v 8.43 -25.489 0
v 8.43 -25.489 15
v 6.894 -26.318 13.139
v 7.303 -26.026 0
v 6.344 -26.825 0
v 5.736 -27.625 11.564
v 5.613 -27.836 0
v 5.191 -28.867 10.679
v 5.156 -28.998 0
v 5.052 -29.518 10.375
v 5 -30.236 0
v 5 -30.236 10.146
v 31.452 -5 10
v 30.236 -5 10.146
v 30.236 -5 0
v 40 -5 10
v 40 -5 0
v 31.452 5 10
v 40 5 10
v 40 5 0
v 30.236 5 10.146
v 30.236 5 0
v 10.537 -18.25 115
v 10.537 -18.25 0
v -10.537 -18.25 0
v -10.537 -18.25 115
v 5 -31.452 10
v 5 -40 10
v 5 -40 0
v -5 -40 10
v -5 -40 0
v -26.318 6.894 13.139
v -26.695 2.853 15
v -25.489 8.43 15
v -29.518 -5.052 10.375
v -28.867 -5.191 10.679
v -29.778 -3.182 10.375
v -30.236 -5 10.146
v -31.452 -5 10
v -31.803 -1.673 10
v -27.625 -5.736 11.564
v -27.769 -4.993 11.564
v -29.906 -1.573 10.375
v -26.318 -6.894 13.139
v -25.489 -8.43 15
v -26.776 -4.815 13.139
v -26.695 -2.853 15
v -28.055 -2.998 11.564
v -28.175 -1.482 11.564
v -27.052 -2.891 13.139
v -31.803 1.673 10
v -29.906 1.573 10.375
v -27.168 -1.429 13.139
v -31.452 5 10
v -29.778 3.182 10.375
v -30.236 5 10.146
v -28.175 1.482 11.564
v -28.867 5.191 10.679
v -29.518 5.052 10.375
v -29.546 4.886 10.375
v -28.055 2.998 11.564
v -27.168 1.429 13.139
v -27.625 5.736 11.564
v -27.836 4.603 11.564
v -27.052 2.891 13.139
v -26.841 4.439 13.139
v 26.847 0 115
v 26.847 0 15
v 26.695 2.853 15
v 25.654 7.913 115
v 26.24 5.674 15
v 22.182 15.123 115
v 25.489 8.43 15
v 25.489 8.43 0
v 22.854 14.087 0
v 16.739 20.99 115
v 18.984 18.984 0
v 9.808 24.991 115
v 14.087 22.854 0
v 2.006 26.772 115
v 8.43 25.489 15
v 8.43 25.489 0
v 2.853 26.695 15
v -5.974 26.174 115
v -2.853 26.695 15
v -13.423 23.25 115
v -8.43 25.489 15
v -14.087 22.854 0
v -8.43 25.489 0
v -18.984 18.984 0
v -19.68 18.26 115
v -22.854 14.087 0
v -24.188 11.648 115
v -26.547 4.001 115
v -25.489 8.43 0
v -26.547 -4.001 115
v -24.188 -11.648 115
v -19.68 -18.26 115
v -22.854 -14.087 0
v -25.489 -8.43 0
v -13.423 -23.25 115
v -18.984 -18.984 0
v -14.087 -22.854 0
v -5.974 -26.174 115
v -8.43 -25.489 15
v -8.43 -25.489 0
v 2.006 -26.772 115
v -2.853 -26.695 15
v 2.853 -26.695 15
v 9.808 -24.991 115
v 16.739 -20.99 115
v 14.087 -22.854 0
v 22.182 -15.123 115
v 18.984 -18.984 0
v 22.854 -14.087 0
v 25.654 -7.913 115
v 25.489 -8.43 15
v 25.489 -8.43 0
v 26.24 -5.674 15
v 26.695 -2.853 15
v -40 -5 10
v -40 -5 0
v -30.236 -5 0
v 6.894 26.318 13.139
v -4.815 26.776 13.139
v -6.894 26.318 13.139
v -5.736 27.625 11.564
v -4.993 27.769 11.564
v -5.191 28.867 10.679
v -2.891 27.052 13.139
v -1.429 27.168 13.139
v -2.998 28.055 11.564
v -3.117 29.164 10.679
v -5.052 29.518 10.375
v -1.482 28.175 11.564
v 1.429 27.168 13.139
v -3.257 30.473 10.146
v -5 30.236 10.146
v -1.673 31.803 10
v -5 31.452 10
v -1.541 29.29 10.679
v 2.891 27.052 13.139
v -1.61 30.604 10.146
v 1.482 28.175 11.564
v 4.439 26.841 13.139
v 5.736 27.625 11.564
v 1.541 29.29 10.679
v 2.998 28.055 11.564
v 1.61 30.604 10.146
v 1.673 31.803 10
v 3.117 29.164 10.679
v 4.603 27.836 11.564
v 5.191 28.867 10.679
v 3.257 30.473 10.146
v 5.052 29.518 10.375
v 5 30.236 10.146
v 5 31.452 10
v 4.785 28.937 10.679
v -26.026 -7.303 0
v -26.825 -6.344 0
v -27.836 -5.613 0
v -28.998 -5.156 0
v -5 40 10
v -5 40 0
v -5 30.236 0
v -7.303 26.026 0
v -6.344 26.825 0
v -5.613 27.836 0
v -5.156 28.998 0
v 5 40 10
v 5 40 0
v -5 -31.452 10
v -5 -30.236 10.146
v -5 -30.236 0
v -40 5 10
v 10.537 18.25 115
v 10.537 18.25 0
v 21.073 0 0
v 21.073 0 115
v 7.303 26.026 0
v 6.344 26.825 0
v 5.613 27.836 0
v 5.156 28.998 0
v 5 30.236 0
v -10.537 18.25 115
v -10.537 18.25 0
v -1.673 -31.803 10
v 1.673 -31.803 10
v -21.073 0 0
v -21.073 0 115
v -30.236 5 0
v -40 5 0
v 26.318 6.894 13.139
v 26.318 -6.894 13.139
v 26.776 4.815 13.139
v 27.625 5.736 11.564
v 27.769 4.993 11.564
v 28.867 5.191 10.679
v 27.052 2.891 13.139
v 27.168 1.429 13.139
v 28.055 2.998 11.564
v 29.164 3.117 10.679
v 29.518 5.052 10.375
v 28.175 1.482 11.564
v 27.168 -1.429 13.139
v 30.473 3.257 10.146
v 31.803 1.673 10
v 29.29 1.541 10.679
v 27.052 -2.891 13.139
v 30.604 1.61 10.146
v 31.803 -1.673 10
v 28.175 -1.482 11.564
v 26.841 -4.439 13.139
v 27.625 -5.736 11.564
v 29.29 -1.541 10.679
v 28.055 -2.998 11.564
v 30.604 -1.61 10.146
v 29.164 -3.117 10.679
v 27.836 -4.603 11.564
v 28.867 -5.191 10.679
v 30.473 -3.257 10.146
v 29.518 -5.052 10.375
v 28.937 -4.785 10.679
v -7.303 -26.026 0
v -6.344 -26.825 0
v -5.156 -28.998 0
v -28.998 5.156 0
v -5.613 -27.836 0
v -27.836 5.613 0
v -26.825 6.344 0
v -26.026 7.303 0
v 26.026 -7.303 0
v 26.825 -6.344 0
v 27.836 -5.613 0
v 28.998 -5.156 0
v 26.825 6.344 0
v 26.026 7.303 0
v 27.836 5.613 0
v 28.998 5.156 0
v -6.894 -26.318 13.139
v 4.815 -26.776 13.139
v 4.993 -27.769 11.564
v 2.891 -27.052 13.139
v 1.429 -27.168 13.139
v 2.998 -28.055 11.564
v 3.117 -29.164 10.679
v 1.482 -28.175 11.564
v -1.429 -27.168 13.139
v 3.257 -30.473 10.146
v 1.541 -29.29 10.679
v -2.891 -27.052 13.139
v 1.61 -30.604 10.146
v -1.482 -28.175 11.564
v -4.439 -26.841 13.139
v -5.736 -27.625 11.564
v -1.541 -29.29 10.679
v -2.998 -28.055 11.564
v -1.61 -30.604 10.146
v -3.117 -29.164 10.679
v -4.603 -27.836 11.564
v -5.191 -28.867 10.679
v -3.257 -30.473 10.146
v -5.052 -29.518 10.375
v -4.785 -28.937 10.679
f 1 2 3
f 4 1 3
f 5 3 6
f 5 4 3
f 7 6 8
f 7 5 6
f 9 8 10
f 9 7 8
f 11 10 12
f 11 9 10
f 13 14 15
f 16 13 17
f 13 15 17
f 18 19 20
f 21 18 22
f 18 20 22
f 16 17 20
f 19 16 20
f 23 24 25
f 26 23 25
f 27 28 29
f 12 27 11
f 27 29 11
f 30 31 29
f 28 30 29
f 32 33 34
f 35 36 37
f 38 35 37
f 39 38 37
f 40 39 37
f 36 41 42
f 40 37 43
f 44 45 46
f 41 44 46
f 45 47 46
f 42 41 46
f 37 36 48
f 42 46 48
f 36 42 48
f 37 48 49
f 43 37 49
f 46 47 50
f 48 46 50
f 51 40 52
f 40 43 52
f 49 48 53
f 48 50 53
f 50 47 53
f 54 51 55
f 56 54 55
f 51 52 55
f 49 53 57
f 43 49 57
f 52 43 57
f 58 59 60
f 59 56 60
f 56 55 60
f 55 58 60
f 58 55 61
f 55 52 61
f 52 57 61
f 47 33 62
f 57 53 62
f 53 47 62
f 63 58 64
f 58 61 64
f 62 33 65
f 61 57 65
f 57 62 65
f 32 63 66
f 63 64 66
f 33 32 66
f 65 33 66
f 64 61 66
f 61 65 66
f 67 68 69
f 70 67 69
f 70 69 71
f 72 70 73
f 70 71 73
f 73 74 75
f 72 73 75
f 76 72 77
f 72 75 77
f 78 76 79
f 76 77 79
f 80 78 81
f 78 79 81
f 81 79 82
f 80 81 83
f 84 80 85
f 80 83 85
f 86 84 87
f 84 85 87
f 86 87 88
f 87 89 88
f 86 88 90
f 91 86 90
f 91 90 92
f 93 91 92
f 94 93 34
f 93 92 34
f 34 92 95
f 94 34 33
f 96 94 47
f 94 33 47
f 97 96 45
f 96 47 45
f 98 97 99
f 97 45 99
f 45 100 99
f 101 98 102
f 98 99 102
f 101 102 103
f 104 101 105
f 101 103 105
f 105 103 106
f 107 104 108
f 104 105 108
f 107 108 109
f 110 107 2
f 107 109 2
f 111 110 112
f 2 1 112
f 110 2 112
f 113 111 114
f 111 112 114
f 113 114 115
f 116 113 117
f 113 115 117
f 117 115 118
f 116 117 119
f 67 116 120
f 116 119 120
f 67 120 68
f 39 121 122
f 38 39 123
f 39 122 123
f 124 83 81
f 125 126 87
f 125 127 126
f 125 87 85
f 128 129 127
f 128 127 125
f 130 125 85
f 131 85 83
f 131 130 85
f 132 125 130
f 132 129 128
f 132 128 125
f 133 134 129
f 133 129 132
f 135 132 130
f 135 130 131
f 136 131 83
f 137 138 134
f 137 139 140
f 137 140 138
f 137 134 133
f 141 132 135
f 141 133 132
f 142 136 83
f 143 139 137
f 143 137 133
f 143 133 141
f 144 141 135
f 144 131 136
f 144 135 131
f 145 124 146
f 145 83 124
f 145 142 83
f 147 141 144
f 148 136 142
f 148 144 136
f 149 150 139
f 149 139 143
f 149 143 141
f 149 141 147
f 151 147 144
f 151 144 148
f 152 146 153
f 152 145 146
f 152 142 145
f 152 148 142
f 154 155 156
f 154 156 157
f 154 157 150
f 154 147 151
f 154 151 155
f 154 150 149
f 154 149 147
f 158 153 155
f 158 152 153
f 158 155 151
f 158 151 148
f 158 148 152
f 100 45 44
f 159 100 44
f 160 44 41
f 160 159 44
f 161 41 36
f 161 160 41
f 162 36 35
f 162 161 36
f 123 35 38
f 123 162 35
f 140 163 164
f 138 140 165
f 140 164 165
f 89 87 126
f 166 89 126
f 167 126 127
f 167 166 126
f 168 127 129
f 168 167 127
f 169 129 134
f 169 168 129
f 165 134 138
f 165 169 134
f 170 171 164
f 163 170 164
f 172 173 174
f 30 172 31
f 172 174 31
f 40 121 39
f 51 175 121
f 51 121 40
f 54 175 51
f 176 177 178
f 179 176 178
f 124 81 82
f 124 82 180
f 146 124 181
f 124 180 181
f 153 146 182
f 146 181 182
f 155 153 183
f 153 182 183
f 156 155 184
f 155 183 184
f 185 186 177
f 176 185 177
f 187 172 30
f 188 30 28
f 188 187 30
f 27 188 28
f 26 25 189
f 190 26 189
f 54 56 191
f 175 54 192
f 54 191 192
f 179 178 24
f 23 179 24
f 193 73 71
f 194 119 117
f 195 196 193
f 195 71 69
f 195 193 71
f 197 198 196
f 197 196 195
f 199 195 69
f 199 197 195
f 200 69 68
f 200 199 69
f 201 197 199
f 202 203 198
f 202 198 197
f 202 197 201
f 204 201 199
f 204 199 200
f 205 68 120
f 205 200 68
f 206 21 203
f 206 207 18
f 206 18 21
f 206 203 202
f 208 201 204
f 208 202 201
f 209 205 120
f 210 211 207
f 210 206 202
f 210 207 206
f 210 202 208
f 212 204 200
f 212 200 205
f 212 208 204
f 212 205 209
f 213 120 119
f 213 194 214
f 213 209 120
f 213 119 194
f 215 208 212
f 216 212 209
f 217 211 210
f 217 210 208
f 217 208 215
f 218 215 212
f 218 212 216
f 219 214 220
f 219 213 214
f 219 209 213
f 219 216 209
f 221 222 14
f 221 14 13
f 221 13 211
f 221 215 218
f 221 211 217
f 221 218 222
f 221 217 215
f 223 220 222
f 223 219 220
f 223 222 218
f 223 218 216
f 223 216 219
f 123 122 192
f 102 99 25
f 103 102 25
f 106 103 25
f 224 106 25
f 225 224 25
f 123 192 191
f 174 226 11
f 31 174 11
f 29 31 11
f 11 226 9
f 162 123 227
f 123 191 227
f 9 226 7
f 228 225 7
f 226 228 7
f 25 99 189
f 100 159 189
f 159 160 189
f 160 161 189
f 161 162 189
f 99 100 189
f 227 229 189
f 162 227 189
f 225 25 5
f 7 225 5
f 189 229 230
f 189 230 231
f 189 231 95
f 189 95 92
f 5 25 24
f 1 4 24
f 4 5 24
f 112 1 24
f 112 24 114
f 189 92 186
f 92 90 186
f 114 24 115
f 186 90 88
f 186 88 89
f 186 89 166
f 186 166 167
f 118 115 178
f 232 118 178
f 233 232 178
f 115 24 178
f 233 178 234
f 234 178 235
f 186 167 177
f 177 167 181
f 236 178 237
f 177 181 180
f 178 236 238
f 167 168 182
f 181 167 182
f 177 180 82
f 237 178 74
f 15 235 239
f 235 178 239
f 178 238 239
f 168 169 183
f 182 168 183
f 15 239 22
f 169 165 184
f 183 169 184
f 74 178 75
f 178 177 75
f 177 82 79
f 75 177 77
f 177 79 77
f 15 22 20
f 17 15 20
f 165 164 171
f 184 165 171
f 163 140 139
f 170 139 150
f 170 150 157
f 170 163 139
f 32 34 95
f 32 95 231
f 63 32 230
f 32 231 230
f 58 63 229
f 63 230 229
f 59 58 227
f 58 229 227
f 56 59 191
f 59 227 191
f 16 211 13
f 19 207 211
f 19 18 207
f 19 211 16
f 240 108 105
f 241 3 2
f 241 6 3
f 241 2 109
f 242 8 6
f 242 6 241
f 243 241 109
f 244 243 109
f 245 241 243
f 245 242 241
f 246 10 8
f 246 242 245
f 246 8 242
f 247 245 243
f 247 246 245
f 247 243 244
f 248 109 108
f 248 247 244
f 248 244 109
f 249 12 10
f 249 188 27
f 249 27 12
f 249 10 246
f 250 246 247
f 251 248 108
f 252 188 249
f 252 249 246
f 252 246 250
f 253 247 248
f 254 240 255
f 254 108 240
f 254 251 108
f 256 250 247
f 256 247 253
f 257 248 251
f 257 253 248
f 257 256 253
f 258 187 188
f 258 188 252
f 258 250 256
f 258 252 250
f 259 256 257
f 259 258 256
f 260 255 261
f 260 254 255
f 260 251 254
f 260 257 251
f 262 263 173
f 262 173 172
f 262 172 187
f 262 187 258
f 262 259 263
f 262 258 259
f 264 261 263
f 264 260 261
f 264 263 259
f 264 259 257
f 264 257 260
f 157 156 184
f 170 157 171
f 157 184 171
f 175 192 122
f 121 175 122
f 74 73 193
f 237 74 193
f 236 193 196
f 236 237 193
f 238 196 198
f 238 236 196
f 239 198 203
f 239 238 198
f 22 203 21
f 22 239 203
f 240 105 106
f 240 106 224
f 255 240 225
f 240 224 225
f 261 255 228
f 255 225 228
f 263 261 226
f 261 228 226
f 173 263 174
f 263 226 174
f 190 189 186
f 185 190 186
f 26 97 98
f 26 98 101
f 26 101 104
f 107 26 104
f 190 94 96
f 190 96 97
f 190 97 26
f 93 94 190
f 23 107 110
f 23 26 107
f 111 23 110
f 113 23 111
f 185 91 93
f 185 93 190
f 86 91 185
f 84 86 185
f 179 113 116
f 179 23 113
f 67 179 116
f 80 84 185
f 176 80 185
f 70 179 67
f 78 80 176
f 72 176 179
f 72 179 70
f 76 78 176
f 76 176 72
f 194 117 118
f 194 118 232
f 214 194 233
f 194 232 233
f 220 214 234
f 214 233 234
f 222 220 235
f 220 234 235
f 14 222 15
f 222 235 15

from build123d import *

# Parameters (mm, degrees)
F0_R     = 26.8467875173
F1_DEPTH = 115
F3_DEPTH = 10
F5_R     = 5


# Not quite as in the source:
# - a feature of the source that left no trace in its solid (it failed there, or was rolled back) is left out


with BuildPart() as f1:
    # F0 (on Top) → F1 (new body)
    with BuildSketch(Plane.XY):
        Circle(F0_R)
        Polygon((-21.0732848254, 0), (-10.5366424127, 18.25), (10.5366424127, 18.25), (21.0732848254, 0), (10.5366424127, -18.25), (-10.5366424127, -18.25), align=None, mode=Mode.SUBTRACT)
    extrude(amount=F1_DEPTH)

    # F2 (on Top) → F3 (join)
    with BuildSketch(Plane.XY):
        Polygon((-40, 5), (-40, 0), (-40, -5), (-21.0732848254, -5), (-21.0732848254, 0), (-21.0732848254, 5), align=None)
        Polygon((0, 40), (-5, 40), (-5, 21.0732848254), (0, 21.0732848254), (5, 21.0732848254), (5, 40), align=None)
        Polygon((40, 0), (40, 5), (21.0732848254, 5), (21.0732848254, 0), (21.0732848254, -5), (40, -5), align=None)
        Polygon((0, -40), (5, -40), (5, -21.0732848254), (0, -21.0732848254), (-5, -21.0732848254), (-5, -40), align=None)
    extrude(amount=F3_DEPTH)

    # F5
    f5_edges = [f1.edges().sort_by_distance(p)[0] for p in [
        (0, 26.846788, 10),
        (-26.846788, 0, 10),
        (0, -26.846788, 10),
        (26.729101, 2.511007, 10),
        (26.729101, -2.511007, 10),
        (26.377073, -5, 5),
        (5, -26.377073, 5),
        (-5, -26.377073, 5),
        (-26.377073, -5, 5),
        (-26.377073, 5, 5),
        (-5, 26.377073, 5),
        (5, 26.377073, 5),
        (26.377073, 5, 5),
    ]]
    fillet(f5_edges, radius=F5_R)


solid = f1.part
